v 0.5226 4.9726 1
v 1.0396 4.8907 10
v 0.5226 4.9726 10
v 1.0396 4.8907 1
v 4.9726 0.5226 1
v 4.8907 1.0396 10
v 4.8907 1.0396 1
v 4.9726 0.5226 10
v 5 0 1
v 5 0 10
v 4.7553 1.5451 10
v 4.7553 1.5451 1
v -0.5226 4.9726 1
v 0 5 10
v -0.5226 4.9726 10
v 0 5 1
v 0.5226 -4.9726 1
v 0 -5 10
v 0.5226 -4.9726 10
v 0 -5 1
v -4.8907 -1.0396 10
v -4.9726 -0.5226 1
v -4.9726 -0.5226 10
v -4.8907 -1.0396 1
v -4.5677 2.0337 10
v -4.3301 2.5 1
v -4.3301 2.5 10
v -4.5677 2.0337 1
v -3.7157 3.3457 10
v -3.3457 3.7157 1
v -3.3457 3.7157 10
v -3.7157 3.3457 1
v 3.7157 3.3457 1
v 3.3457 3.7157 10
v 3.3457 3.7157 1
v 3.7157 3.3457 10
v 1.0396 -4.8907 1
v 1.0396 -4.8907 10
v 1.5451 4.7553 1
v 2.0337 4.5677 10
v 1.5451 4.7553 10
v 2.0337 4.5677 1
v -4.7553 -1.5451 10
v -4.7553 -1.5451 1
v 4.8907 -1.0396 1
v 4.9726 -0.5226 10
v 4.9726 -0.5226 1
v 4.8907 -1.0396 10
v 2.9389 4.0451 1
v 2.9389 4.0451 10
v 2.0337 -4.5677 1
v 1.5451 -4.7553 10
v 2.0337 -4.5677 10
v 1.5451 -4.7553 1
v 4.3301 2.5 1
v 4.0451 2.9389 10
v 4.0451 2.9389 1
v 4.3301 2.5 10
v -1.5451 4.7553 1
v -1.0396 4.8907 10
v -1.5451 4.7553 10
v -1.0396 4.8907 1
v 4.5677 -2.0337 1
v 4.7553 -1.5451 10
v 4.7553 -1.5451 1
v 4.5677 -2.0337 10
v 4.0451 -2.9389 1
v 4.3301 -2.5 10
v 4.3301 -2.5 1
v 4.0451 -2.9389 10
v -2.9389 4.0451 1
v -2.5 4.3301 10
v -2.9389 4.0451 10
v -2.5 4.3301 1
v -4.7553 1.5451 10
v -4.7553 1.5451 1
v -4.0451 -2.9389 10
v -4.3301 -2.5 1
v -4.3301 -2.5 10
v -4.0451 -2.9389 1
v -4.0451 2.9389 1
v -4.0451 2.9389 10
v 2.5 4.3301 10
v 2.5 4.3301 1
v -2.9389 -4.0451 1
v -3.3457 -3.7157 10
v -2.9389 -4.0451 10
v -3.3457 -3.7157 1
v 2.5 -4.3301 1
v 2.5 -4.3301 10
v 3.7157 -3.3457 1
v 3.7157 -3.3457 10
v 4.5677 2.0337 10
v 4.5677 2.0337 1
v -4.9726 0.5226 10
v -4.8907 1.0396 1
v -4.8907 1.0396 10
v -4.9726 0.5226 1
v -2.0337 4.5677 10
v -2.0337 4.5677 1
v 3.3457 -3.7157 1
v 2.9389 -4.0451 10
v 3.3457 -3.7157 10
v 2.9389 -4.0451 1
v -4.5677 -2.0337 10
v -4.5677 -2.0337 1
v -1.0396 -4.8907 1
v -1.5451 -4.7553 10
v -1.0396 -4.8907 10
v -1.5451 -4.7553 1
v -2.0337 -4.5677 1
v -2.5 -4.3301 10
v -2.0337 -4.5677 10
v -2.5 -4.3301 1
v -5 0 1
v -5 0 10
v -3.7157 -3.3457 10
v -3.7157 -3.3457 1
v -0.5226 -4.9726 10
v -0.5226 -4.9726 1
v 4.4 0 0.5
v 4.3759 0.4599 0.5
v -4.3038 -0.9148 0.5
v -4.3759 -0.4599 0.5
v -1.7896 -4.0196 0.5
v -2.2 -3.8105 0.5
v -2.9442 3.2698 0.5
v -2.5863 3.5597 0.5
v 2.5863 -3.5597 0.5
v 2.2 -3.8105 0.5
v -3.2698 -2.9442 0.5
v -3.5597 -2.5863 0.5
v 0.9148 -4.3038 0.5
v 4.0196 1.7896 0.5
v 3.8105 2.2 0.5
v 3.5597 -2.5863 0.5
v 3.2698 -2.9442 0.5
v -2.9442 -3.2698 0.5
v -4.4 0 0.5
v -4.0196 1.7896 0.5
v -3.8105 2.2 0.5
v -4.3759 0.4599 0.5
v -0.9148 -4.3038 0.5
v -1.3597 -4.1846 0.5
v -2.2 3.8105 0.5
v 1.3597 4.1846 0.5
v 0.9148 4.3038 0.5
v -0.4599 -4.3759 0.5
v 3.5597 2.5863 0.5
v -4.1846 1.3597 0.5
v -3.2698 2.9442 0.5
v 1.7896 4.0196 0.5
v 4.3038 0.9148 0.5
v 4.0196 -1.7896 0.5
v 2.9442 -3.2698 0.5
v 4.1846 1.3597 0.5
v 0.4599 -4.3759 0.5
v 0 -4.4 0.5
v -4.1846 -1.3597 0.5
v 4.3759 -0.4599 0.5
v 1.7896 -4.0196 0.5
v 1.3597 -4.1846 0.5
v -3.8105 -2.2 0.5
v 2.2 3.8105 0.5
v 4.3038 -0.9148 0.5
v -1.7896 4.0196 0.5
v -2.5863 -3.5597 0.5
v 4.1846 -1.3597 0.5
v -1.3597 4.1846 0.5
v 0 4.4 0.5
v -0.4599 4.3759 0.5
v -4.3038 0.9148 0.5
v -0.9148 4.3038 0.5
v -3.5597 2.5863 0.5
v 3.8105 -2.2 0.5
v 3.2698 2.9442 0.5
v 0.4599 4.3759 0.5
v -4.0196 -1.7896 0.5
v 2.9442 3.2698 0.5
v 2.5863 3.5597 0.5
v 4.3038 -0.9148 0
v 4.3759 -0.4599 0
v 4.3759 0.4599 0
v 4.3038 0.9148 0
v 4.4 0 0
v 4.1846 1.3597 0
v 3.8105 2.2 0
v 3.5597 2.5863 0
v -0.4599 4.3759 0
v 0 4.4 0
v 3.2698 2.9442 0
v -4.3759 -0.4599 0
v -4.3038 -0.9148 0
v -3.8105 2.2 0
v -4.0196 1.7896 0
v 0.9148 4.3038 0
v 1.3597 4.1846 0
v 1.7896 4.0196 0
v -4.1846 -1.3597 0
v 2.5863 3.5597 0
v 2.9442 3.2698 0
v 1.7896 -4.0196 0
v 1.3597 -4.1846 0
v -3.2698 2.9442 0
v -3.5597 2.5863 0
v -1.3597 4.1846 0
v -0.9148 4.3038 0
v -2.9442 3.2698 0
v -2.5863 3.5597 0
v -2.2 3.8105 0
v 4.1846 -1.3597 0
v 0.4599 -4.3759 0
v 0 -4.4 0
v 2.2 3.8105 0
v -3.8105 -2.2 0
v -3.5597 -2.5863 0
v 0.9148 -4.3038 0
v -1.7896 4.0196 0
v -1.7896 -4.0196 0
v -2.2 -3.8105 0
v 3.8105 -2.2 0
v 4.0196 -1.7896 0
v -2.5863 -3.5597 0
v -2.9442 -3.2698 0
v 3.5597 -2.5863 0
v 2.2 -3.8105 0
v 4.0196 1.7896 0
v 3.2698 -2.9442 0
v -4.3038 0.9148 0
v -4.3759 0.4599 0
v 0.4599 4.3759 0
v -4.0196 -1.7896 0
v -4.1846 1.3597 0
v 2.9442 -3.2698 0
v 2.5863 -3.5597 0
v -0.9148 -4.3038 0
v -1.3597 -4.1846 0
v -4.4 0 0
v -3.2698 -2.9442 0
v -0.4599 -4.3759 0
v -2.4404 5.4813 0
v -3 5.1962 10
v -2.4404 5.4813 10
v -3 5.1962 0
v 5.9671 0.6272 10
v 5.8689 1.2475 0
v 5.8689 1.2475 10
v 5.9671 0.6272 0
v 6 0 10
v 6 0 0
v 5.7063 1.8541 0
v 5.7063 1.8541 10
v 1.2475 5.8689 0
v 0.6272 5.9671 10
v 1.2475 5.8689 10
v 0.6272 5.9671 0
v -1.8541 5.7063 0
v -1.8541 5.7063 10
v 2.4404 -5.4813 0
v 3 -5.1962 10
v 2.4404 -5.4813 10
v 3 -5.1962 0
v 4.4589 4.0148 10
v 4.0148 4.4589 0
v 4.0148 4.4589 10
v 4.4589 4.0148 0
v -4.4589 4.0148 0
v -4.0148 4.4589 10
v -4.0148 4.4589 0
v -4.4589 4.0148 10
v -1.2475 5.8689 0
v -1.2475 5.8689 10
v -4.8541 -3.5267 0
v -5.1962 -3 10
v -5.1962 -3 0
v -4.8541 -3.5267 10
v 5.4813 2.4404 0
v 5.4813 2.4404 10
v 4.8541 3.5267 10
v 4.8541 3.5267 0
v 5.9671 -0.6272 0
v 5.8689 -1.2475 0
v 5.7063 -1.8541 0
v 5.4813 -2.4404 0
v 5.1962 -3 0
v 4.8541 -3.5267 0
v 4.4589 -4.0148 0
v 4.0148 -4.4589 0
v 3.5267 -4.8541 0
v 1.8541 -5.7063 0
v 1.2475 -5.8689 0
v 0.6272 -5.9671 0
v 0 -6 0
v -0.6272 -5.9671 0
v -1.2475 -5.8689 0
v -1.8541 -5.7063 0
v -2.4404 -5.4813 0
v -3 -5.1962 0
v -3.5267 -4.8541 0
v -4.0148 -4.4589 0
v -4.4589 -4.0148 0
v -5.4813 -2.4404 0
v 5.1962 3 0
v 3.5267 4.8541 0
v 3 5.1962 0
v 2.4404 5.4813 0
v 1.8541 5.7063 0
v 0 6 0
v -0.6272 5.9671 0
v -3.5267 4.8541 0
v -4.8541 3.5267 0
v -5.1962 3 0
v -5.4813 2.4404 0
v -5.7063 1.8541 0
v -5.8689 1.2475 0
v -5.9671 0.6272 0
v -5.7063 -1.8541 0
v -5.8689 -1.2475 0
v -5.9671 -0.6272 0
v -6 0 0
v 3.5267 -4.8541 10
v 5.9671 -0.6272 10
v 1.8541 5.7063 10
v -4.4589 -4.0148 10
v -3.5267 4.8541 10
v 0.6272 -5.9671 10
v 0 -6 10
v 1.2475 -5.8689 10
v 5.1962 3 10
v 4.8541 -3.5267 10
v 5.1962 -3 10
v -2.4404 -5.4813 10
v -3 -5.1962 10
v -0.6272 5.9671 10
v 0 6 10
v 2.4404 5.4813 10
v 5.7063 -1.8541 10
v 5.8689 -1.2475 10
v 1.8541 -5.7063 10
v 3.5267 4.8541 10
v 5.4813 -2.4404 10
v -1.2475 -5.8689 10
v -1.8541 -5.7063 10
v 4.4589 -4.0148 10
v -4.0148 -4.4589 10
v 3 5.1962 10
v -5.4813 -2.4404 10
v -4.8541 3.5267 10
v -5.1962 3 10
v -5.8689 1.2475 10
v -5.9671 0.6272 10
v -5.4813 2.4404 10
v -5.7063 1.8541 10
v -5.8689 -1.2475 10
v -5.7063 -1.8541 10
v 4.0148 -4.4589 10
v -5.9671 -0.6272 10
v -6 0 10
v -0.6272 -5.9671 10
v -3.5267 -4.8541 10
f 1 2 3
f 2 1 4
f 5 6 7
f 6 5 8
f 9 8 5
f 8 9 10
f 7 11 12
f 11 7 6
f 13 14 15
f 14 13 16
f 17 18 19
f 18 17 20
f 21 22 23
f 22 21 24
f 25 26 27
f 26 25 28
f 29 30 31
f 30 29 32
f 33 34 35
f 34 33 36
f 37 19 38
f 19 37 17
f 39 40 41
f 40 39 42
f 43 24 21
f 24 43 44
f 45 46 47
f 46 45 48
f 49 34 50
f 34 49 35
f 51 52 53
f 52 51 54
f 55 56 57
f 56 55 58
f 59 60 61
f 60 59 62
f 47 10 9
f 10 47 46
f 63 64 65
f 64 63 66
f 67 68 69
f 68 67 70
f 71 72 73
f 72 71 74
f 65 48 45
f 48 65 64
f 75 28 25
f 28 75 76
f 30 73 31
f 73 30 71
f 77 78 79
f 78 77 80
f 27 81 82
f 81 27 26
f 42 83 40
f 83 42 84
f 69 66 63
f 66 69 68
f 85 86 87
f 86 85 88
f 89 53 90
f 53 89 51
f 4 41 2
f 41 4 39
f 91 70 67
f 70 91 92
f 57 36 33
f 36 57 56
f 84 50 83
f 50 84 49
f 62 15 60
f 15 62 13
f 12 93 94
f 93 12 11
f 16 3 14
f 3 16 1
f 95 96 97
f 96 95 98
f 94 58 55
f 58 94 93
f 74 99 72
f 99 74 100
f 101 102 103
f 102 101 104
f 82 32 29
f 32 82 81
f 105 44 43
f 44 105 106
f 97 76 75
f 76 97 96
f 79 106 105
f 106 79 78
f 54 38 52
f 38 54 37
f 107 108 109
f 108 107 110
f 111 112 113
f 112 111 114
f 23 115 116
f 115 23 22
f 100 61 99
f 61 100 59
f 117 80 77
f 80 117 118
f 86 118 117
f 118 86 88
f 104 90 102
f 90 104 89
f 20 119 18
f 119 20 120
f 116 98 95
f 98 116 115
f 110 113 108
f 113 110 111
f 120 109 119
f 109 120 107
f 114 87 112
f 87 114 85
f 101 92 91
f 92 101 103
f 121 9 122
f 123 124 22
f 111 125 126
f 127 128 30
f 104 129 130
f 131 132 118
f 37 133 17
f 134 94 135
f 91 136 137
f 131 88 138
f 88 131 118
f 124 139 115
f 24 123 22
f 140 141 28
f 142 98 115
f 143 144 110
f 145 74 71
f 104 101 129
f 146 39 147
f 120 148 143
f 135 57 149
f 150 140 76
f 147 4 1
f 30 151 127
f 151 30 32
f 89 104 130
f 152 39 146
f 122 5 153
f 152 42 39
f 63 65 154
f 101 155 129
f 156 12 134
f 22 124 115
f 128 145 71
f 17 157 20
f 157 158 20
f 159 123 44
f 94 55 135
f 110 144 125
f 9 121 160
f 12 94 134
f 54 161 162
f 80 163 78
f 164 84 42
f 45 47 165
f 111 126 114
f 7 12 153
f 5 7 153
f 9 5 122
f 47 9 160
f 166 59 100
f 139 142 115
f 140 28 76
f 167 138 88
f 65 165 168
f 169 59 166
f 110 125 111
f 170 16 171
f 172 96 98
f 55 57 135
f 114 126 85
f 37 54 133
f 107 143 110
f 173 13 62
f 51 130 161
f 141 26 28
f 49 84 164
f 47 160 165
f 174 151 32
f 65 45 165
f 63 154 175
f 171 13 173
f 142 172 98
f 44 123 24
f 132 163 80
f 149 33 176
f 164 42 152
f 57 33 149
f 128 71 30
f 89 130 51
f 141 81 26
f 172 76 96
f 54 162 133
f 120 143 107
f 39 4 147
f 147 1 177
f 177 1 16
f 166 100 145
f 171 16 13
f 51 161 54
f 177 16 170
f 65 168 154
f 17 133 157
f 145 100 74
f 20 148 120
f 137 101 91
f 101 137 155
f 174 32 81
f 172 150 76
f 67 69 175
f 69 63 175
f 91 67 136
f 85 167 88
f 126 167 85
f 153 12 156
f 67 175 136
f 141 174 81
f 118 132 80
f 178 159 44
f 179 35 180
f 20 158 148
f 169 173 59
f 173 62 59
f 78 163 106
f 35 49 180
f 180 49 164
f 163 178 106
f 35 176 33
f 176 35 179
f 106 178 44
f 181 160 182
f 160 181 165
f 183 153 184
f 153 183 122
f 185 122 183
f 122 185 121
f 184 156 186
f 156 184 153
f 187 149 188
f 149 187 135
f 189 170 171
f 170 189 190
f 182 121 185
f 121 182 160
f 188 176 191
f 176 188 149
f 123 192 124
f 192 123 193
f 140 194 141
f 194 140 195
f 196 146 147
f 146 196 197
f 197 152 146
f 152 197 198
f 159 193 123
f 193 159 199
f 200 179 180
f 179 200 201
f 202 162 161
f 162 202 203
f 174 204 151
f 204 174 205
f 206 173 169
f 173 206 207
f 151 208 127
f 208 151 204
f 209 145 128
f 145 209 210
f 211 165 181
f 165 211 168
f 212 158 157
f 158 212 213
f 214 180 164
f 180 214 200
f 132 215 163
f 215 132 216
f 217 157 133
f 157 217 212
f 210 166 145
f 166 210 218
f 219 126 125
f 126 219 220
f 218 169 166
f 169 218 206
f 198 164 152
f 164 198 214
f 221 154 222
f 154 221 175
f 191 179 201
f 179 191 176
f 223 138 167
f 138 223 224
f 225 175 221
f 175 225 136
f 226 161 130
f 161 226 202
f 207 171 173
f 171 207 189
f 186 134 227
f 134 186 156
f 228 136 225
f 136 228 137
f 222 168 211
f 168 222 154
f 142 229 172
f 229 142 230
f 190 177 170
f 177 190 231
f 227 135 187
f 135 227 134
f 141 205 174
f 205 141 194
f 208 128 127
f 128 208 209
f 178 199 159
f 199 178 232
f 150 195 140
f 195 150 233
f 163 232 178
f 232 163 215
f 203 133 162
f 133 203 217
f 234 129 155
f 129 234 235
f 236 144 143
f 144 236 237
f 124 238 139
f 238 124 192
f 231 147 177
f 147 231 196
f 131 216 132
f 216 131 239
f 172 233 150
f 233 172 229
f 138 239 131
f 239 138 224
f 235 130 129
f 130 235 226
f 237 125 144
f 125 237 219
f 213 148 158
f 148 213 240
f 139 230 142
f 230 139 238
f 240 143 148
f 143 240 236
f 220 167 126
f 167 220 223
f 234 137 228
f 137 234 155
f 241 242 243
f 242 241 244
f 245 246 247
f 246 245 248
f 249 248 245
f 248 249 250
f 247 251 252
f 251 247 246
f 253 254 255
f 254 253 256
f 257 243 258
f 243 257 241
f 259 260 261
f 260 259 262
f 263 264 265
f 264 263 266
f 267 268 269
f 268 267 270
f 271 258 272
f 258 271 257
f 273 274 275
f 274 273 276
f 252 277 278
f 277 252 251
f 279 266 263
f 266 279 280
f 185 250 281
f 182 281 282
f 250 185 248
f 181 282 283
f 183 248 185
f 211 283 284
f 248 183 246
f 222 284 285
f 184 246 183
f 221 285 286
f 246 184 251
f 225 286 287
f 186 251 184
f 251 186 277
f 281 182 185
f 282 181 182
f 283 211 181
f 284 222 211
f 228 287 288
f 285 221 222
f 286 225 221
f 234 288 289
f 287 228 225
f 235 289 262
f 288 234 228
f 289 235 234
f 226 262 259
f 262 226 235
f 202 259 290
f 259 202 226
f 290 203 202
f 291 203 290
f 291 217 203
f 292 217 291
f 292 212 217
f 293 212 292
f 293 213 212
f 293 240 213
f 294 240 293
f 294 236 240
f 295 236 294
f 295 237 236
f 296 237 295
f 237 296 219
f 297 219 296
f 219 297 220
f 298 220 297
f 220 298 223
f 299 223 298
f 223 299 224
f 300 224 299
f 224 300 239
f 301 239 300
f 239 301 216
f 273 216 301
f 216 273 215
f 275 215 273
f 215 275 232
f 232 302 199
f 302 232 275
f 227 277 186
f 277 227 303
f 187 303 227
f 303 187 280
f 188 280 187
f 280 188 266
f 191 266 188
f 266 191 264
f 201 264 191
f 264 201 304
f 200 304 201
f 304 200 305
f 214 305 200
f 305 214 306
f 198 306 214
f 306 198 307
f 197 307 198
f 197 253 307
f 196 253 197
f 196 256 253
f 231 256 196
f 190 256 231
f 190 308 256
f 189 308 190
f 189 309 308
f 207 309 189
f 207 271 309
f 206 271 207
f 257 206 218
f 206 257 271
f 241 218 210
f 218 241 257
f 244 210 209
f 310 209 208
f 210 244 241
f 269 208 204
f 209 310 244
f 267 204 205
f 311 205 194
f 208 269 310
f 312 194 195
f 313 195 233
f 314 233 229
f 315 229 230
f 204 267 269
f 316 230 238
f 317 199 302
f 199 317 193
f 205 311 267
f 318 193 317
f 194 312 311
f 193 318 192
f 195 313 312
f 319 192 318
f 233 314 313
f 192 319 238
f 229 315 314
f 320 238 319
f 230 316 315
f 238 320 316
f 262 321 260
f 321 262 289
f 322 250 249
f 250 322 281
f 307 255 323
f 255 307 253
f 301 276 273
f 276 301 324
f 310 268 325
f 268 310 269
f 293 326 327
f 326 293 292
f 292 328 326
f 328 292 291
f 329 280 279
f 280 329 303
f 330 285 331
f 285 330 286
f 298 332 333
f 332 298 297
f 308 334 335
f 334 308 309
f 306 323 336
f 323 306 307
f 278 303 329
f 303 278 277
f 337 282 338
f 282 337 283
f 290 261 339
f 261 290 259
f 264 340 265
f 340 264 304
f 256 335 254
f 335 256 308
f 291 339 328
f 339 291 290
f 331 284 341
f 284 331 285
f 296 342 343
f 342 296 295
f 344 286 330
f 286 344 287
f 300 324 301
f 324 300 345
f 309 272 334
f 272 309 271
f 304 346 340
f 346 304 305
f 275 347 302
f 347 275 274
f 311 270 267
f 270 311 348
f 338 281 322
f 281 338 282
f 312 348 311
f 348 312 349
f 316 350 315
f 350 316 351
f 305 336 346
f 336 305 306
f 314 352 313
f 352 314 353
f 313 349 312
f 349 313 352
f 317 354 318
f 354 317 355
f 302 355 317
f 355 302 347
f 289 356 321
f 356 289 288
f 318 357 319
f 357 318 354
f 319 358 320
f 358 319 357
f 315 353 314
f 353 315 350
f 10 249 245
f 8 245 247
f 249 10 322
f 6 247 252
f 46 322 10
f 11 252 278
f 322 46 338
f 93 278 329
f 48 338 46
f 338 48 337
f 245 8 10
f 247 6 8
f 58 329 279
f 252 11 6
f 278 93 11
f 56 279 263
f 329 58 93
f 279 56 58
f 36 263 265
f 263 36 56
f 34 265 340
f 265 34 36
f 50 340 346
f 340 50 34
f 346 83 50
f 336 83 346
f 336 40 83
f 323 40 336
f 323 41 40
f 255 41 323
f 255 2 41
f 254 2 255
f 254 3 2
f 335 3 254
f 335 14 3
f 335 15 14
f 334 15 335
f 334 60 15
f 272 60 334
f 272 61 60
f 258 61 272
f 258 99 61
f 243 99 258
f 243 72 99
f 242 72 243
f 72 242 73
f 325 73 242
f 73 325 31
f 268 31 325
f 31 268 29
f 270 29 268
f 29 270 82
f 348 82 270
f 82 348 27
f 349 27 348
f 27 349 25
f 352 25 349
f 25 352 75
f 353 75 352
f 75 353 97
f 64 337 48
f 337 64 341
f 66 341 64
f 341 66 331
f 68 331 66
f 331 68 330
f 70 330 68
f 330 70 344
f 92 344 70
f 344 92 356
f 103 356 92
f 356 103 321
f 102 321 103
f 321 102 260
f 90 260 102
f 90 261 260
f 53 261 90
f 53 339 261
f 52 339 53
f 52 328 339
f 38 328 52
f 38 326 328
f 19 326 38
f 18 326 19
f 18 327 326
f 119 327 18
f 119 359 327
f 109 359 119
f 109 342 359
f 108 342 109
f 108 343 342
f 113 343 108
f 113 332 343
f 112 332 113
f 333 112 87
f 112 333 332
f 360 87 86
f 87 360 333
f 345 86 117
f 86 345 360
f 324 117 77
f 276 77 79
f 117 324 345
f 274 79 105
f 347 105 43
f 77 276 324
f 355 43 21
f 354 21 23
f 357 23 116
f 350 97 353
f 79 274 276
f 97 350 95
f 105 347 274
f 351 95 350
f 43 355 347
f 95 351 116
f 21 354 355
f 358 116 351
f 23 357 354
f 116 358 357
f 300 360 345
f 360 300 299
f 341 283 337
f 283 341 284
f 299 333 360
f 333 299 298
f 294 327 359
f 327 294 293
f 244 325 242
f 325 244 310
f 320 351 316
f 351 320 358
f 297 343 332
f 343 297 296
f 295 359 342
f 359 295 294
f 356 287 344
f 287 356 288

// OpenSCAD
RecessedCylinderSupport();

module RecessedCylinderSupport(
	height		= 10,
	outerRadius	= 6,
	innerRadius	= 5,
	shelfHeight	= 1,
	shelfWidth	= 0.3
)
{
	shelfInnerRadius = innerRadius - shelfWidth * 2;

	difference(){
		// Sleeve
		cylinder(h=height,r=outerRadius,$fn=60);
		// Countersunk hole
		translate([0, 0, -height + shelfHeight/2])
			union(){
				translate([0, 0, height + shelfHeight/2]) 
					cylinder(h=height,r=innerRadius,$fn=60);
				translate([0, 0, height]) 
					cylinder(h=shelfHeight/2,r1=shelfInnerRadius,r2=innerRadius,$fn=60);
				cylinder(h=height,r=shelfInnerRadius,$fn=60);
			}
	}
} // RecessedCylinderSupport
